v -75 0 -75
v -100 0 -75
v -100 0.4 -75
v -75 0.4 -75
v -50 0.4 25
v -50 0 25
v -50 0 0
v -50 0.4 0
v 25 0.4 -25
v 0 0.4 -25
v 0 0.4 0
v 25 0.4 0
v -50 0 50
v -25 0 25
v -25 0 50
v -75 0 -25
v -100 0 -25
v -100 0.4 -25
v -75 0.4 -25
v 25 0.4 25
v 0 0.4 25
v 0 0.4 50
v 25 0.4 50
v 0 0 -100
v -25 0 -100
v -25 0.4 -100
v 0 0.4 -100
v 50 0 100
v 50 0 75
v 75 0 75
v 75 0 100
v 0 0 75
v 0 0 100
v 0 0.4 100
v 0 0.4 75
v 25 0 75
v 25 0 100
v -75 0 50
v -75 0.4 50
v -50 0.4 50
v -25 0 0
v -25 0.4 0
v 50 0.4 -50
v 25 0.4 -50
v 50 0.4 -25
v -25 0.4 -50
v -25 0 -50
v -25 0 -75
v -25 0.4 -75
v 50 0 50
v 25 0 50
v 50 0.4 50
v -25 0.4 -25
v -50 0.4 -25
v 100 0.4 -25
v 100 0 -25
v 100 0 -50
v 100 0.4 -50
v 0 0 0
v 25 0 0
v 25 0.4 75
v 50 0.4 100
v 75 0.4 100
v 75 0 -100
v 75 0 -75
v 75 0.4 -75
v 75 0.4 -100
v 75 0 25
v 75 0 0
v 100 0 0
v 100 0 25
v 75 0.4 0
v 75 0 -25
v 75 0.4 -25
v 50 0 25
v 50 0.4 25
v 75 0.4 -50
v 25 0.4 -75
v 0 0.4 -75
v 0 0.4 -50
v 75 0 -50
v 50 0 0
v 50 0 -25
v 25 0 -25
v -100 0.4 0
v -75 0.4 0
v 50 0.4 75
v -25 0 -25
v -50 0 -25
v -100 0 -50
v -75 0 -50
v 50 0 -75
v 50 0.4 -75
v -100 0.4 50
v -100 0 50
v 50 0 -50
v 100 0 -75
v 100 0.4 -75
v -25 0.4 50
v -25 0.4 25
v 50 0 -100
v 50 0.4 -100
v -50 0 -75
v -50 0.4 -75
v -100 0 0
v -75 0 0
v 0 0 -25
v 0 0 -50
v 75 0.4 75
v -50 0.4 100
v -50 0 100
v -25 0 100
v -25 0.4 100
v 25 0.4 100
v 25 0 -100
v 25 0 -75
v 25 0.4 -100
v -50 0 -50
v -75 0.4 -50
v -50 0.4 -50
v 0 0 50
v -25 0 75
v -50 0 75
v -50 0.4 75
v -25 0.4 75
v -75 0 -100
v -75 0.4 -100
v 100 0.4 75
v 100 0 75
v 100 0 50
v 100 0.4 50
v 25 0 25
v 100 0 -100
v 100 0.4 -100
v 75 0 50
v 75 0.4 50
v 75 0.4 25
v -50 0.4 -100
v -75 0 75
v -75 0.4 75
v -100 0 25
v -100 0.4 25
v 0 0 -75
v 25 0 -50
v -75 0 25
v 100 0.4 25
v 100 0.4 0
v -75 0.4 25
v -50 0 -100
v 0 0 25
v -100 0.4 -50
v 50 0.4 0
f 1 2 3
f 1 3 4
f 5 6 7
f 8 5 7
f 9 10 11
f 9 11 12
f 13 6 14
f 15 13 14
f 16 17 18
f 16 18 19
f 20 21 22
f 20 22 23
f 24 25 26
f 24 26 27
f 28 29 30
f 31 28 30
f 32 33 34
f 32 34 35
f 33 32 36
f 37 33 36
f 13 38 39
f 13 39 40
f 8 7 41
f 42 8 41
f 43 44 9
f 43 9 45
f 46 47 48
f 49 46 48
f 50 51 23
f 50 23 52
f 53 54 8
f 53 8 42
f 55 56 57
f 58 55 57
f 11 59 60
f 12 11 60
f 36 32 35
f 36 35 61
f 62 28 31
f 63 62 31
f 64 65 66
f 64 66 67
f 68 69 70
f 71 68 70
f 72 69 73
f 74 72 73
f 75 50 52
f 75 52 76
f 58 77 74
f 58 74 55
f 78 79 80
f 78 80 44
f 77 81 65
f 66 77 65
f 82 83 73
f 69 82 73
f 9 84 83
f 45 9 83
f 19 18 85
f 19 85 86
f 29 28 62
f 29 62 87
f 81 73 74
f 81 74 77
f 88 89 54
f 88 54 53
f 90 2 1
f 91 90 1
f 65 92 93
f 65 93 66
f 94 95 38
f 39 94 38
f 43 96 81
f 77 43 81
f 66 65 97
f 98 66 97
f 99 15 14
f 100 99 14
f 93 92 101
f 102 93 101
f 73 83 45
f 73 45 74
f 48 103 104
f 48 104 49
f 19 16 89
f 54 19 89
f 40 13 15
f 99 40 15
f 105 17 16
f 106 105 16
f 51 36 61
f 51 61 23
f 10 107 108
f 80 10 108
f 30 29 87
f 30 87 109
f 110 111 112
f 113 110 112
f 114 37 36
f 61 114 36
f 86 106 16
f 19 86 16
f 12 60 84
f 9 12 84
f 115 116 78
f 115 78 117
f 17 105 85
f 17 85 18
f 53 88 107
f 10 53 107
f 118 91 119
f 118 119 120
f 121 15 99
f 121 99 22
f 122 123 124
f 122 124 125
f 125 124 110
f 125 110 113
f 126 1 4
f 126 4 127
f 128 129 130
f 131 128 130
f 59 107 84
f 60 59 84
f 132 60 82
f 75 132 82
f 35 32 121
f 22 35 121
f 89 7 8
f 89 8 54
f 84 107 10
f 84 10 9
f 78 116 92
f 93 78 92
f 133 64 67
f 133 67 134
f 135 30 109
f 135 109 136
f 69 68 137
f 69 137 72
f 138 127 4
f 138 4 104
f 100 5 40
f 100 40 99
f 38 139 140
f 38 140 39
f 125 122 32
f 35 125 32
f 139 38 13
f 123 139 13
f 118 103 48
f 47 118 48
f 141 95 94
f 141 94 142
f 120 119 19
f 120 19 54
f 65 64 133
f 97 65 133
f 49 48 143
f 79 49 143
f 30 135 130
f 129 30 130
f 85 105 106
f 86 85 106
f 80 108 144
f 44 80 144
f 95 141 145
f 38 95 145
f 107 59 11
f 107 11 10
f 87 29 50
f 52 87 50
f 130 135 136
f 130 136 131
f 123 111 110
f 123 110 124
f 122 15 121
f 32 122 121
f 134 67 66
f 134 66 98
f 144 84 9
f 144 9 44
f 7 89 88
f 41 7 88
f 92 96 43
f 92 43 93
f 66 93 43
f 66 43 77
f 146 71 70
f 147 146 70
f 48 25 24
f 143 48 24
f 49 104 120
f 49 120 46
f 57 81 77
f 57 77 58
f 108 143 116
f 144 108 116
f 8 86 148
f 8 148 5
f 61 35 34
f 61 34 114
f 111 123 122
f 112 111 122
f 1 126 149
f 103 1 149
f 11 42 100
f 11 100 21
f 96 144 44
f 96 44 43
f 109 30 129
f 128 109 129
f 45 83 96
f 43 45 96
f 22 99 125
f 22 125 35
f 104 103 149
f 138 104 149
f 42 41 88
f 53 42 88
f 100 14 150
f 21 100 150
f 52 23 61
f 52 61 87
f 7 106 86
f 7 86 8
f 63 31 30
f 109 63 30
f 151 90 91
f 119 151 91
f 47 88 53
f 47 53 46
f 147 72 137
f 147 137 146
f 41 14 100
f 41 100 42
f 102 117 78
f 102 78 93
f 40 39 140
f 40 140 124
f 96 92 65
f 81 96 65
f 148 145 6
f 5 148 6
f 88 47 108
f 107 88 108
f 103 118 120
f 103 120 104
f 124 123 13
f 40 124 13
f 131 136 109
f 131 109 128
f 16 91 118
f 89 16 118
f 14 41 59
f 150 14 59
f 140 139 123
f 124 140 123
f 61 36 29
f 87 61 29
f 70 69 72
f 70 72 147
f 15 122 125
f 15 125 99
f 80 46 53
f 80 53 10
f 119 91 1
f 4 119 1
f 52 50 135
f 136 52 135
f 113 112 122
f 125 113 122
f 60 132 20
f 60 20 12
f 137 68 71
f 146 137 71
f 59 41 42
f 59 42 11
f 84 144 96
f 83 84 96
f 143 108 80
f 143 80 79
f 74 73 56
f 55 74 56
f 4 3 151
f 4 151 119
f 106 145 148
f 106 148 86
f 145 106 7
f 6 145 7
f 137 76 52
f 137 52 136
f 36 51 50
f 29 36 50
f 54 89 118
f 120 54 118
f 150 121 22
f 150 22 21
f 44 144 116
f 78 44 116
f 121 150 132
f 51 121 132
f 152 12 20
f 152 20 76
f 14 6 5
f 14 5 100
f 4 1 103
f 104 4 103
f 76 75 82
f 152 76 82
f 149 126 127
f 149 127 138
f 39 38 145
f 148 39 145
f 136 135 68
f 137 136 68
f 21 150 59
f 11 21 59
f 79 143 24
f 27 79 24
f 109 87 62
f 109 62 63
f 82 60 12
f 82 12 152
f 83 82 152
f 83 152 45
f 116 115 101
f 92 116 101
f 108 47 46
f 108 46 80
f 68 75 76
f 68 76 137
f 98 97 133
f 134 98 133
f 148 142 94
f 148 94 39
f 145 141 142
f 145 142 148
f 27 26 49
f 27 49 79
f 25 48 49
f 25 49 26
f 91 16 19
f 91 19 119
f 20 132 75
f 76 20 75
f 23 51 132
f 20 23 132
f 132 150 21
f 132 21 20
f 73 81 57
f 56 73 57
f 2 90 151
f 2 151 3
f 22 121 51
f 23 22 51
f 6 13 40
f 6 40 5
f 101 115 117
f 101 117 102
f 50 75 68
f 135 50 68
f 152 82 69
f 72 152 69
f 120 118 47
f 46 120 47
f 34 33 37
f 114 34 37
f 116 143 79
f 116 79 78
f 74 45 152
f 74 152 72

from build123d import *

# Parameters (mm, degrees)
SKETCH1_W              = 25
SKETCH1_H              = 25
BOSS_EXTRUDE1_DEPTH    = 0.4
BOSS_EXTRUDE1_2_DEPTH  = 0.4
BOSS_EXTRUDE1_3_DEPTH  = 0.4
BOSS_EXTRUDE1_4_DEPTH  = 0.4
BOSS_EXTRUDE1_5_DEPTH  = 0.4
BOSS_EXTRUDE1_6_DEPTH  = 0.4
BOSS_EXTRUDE1_7_DEPTH  = 0.4
BOSS_EXTRUDE1_8_DEPTH  = 0.4
BOSS_EXTRUDE1_9_DEPTH  = 0.4
BOSS_EXTRUDE1_10_DEPTH = 0.4
BOSS_EXTRUDE1_11_DEPTH = 0.4
BOSS_EXTRUDE1_12_DEPTH = 0.4
BOSS_EXTRUDE1_13_DEPTH = 0.4
BOSS_EXTRUDE1_14_DEPTH = 0.4
BOSS_EXTRUDE1_15_DEPTH = 0.4
BOSS_EXTRUDE1_16_DEPTH = 0.4
BOSS_EXTRUDE1_17_DEPTH = 0.4
BOSS_EXTRUDE1_18_DEPTH = 0.4
BOSS_EXTRUDE1_19_DEPTH = 0.4
BOSS_EXTRUDE1_20_DEPTH = 0.4
BOSS_EXTRUDE1_21_DEPTH = 0.4
BOSS_EXTRUDE1_22_DEPTH = 0.4
BOSS_EXTRUDE1_23_DEPTH = 0.4
BOSS_EXTRUDE1_24_DEPTH = 0.4
BOSS_EXTRUDE1_25_DEPTH = 0.4
BOSS_EXTRUDE1_26_DEPTH = 0.4
BOSS_EXTRUDE1_27_DEPTH = 0.4
BOSS_EXTRUDE1_28_DEPTH = 0.4
BOSS_EXTRUDE1_29_DEPTH = 0.4
BOSS_EXTRUDE1_30_DEPTH = 0.4
BOSS_EXTRUDE1_31_DEPTH = 0.4


with BuildPart() as part:
    # Sketch1 → Boss-Extrude1 (new body)
    with BuildSketch(Plane(origin=(0, 0, 0), x_dir=(1, 0, 0), z_dir=(0, 1, 0))):
        with Locations((-62.5, -62.5)):
            Rectangle(SKETCH1_W, SKETCH1_H)
    extrude(amount=BOSS_EXTRUDE1_DEPTH)


with BuildPart() as body_2:
    # Sketch1 → Boss-Extrude1 2 (new body)
    with BuildSketch(Plane(origin=(0, 0, 0), x_dir=(1, 0, 0), z_dir=(0, 1, 0))):
        with Locations((-37.5, -87.5)):
            Rectangle(SKETCH1_W, SKETCH1_H)
    extrude(amount=BOSS_EXTRUDE1_2_DEPTH)


with BuildPart() as body_3:
    # Sketch1 → Boss-Extrude1 3 (new body)
    with BuildSketch(Plane(origin=(0, 0, 0), x_dir=(1, 0, 0), z_dir=(0, 1, 0))):
        with Locations((-12.5, -62.5)):
            Rectangle(SKETCH1_W, SKETCH1_H)
    extrude(amount=BOSS_EXTRUDE1_3_DEPTH)


with BuildPart() as body_4:
    # Sketch1 → Boss-Extrude1 4 (new body)
    with BuildSketch(Plane(origin=(0, 0, 0), x_dir=(1, 0, 0), z_dir=(0, 1, 0))):
        with Locations((12.5, -87.5)):
            Rectangle(SKETCH1_W, SKETCH1_H)
    extrude(amount=BOSS_EXTRUDE1_4_DEPTH)


with BuildPart() as body_5:
    # Sketch1 → Boss-Extrude1 5 (new body)
    with BuildSketch(Plane(origin=(0, 0, 0), x_dir=(1, 0, 0), z_dir=(0, 1, 0))):
        with Locations((37.5, -62.5)):
            Rectangle(SKETCH1_W, SKETCH1_H)
    extrude(amount=BOSS_EXTRUDE1_5_DEPTH)


with BuildPart() as body_6:
    # Sketch1 → Boss-Extrude1 6 (new body)
    with BuildSketch(Plane(origin=(0, 0, 0), x_dir=(1, 0, 0), z_dir=(0, 1, 0))):
        with Locations((62.5, -87.5)):
            Rectangle(SKETCH1_W, SKETCH1_H)
    extrude(amount=BOSS_EXTRUDE1_6_DEPTH)


with BuildPart() as body_7:
    # Sketch1 → Boss-Extrude1 7 (new body)
    with BuildSketch(Plane(origin=(0, 0, 0), x_dir=(1, 0, 0), z_dir=(0, 1, 0))):
        with Locations((87.5, -62.5)):
            Rectangle(SKETCH1_W, SKETCH1_H)
    extrude(amount=BOSS_EXTRUDE1_7_DEPTH)


with BuildPart() as body_8:
    # Sketch1 → Boss-Extrude1 8 (new body)
    with BuildSketch(Plane(origin=(0, 0, 0), x_dir=(1, 0, 0), z_dir=(0, 1, 0))):
        with Locations((62.5, -37.5)):
            Rectangle(SKETCH1_W, SKETCH1_H)
    extrude(amount=BOSS_EXTRUDE1_8_DEPTH)


with BuildPart() as body_9:
    # Sketch1 → Boss-Extrude1 9 (new body)
    with BuildSketch(Plane(origin=(0, 0, 0), x_dir=(1, 0, 0), z_dir=(0, 1, 0))):
        with Locations((37.5, -12.5)):
            Rectangle(SKETCH1_W, SKETCH1_H)
    extrude(amount=BOSS_EXTRUDE1_9_DEPTH)


with BuildPart() as body_10:
    # Sketch1 → Boss-Extrude1 10 (new body)
    with BuildSketch(Plane(origin=(0, 0, 0), x_dir=(1, 0, 0), z_dir=(0, 1, 0))):
        with Locations((12.5, -37.5)):
            Rectangle(SKETCH1_W, SKETCH1_H)
    extrude(amount=BOSS_EXTRUDE1_10_DEPTH)


with BuildPart() as body_11:
    # Sketch1 → Boss-Extrude1 11 (new body)
    with BuildSketch(Plane(origin=(0, 0, 0), x_dir=(1, 0, 0), z_dir=(0, 1, 0))):
        with Locations((-37.5, -37.5)):
            Rectangle(SKETCH1_W, SKETCH1_H)
    extrude(amount=BOSS_EXTRUDE1_11_DEPTH)


with BuildPart() as body_12:
    # Sketch1 → Boss-Extrude1 12 (new body)
    with BuildSketch(Plane(origin=(0, 0, 0), x_dir=(1, 0, 0), z_dir=(0, 1, 0))):
        with Locations((-87.5, -37.5)):
            Rectangle(SKETCH1_W, SKETCH1_H)
    extrude(amount=BOSS_EXTRUDE1_12_DEPTH)


with BuildPart() as body_13:
    # Sketch1 → Boss-Extrude1 13 (new body)
    with BuildSketch(Plane(origin=(0, 0, 0), x_dir=(1, 0, 0), z_dir=(0, 1, 0))):
        with Locations((-62.5, -12.5)):
            Rectangle(SKETCH1_W, SKETCH1_H)
    extrude(amount=BOSS_EXTRUDE1_13_DEPTH)


with BuildPart() as body_14:
    # Sketch1 → Boss-Extrude1 14 (new body)
    with BuildSketch(Plane(origin=(0, 0, 0), x_dir=(1, 0, 0), z_dir=(0, 1, 0))):
        with Locations((-87.5, 12.5)):
            Rectangle(SKETCH1_W, SKETCH1_H)
    extrude(amount=BOSS_EXTRUDE1_14_DEPTH)


with BuildPart() as body_15:
    # Sketch1 → Boss-Extrude1 15 (new body)
    with BuildSketch(Plane(origin=(0, 0, 0), x_dir=(1, 0, 0), z_dir=(0, 1, 0))):
        with Locations((-62.5, 37.5)):
            Rectangle(SKETCH1_W, SKETCH1_H)
    extrude(amount=BOSS_EXTRUDE1_15_DEPTH)


with BuildPart() as body_16:
    # Sketch1 → Boss-Extrude1 16 (new body)
    with BuildSketch(Plane(origin=(0, 0, 0), x_dir=(1, 0, 0), z_dir=(0, 1, 0))):
        with Locations((-87.5, 62.5)):
            Rectangle(SKETCH1_W, SKETCH1_H)
    extrude(amount=BOSS_EXTRUDE1_16_DEPTH)


with BuildPart() as body_17:
    # Sketch1 → Boss-Extrude1 17 (new body)
    with BuildSketch(Plane(origin=(0, 0, 0), x_dir=(1, 0, 0), z_dir=(0, 1, 0))):
        with Locations((-62.5, 87.5)):
            Rectangle(SKETCH1_W, SKETCH1_H)
    extrude(amount=BOSS_EXTRUDE1_17_DEPTH)


with BuildPart() as body_18:
    # Sketch1 → Boss-Extrude1 18 (new body)
    with BuildSketch(Plane(origin=(0, 0, 0), x_dir=(1, 0, 0), z_dir=(0, 1, 0))):
        with Locations((-37.5, 62.5)):
            Rectangle(SKETCH1_W, SKETCH1_H)
    extrude(amount=BOSS_EXTRUDE1_18_DEPTH)


with BuildPart() as body_19:
    # Sketch1 → Boss-Extrude1 19 (new body)
    with BuildSketch(Plane(origin=(0, 0, 0), x_dir=(1, 0, 0), z_dir=(0, 1, 0))):
        with Locations((-12.5, 87.5)):
            Rectangle(SKETCH1_W, SKETCH1_H)
    extrude(amount=BOSS_EXTRUDE1_19_DEPTH)


with BuildPart() as body_20:
    # Sketch1 → Boss-Extrude1 20 (new body)
    with BuildSketch(Plane(origin=(0, 0, 0), x_dir=(1, 0, 0), z_dir=(0, 1, 0))):
        with Locations((12.5, 62.5)):
            Rectangle(SKETCH1_W, SKETCH1_H)
    extrude(amount=BOSS_EXTRUDE1_20_DEPTH)


with BuildPart() as body_21:
    # Sketch1 → Boss-Extrude1 21 (new body)
    with BuildSketch(Plane(origin=(0, 0, 0), x_dir=(1, 0, 0), z_dir=(0, 1, 0))):
        with Locations((37.5, 87.5)):
            Rectangle(SKETCH1_W, SKETCH1_H)
    extrude(amount=BOSS_EXTRUDE1_21_DEPTH)


with BuildPart() as body_22:
    # Sketch1 → Boss-Extrude1 22 (new body)
    with BuildSketch(Plane(origin=(0, 0, 0), x_dir=(1, 0, 0), z_dir=(0, 1, 0))):
        with Locations((62.5, 62.5)):
            Rectangle(SKETCH1_W, SKETCH1_H)
    extrude(amount=BOSS_EXTRUDE1_22_DEPTH)


with BuildPart() as body_23:
    # Sketch1 → Boss-Extrude1 23 (new body)
    with BuildSketch(Plane(origin=(0, 0, 0), x_dir=(1, 0, 0), z_dir=(0, 1, 0))):
        with Locations((87.5, 37.5)):
            Rectangle(SKETCH1_W, SKETCH1_H)
    extrude(amount=BOSS_EXTRUDE1_23_DEPTH)


with BuildPart() as body_24:
    # Sketch1 → Boss-Extrude1 24 (new body)
    with BuildSketch(Plane(origin=(0, 0, 0), x_dir=(1, 0, 0), z_dir=(0, 1, 0))):
        with Locations((62.5, 12.5)):
            Rectangle(SKETCH1_W, SKETCH1_H)
    extrude(amount=BOSS_EXTRUDE1_24_DEPTH)


with BuildPart() as body_25:
    # Sketch1 → Boss-Extrude1 25 (new body)
    with BuildSketch(Plane(origin=(0, 0, 0), x_dir=(1, 0, 0), z_dir=(0, 1, 0))):
        with Locations((87.5, -12.5)):
            Rectangle(SKETCH1_W, SKETCH1_H)
    extrude(amount=BOSS_EXTRUDE1_25_DEPTH)


with BuildPart() as body_26:
    # Sketch1 → Boss-Extrude1 26 (new body)
    with BuildSketch(Plane(origin=(0, 0, 0), x_dir=(1, 0, 0), z_dir=(0, 1, 0))):
        with Locations((37.5, 37.5)):
            Rectangle(SKETCH1_W, SKETCH1_H)
    extrude(amount=BOSS_EXTRUDE1_26_DEPTH)


with BuildPart() as body_27:
    # Sketch1 → Boss-Extrude1 27 (new body)
    with BuildSketch(Plane(origin=(0, 0, 0), x_dir=(1, 0, 0), z_dir=(0, 1, 0))):
        with Locations((12.5, 12.5)):
            Rectangle(SKETCH1_W, SKETCH1_H)
    extrude(amount=BOSS_EXTRUDE1_27_DEPTH)


with BuildPart() as body_28:
    # Sketch1 → Boss-Extrude1 28 (new body)
    with BuildSketch(Plane(origin=(0, 0, 0), x_dir=(1, 0, 0), z_dir=(0, 1, 0))):
        with Locations((-12.5, 37.5)):
            Rectangle(SKETCH1_W, SKETCH1_H)
    extrude(amount=BOSS_EXTRUDE1_28_DEPTH)


with BuildPart() as body_29:
    # Sketch1 → Boss-Extrude1 29 (new body)
    with BuildSketch(Plane(origin=(0, 0, 0), x_dir=(1, 0, 0), z_dir=(0, 1, 0))):
        with Locations((-37.5, 12.5)):
            Rectangle(SKETCH1_W, SKETCH1_H)
    extrude(amount=BOSS_EXTRUDE1_29_DEPTH)


with BuildPart() as body_30:
    # Sketch1 → Boss-Extrude1 30 (new body)
    with BuildSketch(Plane(origin=(0, 0, 0), x_dir=(1, 0, 0), z_dir=(0, 1, 0))):
        with Locations((-12.5, -12.5)):
            Rectangle(SKETCH1_W, SKETCH1_H)
    extrude(amount=BOSS_EXTRUDE1_30_DEPTH)


with BuildPart() as body_31:
    # Sketch1 → Boss-Extrude1 31 (new body)
    with BuildSketch(Plane(origin=(0, 0, 0), x_dir=(1, 0, 0), z_dir=(0, 1, 0))):
        with Locations((87.5, 87.5)):
            Rectangle(SKETCH1_W, SKETCH1_H)
    extrude(amount=BOSS_EXTRUDE1_31_DEPTH)


solid = Compound([part.part, body_2.part, body_3.part, body_4.part, body_5.part, body_6.part, body_7.part, body_8.part, body_9.part, body_10.part, body_11.part, body_12.part, body_13.part, body_14.part, body_15.part, body_16.part, body_17.part, body_18.part, body_19.part, body_20.part, body_21.part, body_22.part, body_23.part, body_24.part, body_25.part, body_26.part, body_27.part, body_28.part, body_29.part, body_30.part, body_31.part])
